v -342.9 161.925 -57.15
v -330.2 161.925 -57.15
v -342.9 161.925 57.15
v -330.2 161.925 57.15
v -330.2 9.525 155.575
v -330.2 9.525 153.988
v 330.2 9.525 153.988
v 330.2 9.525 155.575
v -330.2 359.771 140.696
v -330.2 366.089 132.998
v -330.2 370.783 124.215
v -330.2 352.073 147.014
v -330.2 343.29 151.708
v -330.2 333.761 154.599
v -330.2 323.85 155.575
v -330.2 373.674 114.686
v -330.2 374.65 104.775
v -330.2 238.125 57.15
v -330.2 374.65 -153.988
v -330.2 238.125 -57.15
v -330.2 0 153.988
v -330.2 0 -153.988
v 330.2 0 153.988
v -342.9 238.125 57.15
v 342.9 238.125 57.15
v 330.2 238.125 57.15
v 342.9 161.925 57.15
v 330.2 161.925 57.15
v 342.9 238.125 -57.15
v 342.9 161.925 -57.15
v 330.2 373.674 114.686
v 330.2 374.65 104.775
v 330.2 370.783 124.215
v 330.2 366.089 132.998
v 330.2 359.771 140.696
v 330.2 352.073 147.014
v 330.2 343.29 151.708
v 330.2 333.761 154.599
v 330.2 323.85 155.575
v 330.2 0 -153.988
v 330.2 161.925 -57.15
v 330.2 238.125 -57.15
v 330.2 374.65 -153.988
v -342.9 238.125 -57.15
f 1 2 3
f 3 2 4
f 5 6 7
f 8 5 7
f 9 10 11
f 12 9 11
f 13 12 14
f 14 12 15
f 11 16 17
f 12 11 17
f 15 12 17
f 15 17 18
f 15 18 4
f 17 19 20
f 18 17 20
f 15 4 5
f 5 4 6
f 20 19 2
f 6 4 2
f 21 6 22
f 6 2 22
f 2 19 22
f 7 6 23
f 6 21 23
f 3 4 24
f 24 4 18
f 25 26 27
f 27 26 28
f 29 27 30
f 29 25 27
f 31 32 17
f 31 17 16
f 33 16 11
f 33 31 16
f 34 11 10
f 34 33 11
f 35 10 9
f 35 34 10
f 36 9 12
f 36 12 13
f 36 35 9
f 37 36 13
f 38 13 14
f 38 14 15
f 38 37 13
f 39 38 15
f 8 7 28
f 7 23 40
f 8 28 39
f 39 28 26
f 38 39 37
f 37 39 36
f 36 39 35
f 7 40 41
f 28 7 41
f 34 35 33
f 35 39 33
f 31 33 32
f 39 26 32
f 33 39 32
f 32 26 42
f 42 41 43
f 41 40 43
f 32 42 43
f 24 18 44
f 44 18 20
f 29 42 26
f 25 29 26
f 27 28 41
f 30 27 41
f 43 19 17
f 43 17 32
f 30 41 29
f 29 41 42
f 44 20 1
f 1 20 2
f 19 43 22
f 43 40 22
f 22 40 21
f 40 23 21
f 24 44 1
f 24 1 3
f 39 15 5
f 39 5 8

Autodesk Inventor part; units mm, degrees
ref_plane "YZ Plane" through (0, 0, 0) normal (1, 0, 0) x (0, 1, 0)
ref_plane "XZ Plane" through (0, 0, 0) normal (0, 1, 0) x (-1, 0, 0)
ref_plane "XY Plane" through (0, 0, 0) normal (0, 0, 1) x (1, 0, 0)
sketch "Sketch1" plane through (0, 0, 0) normal (0, 1, 0) x (-1, 0, 0)
  line L0 (330.2, 153.9875) -> (-330.2, 153.9875)
  line L1 (-330.2, 153.9875) -> (-330.2, -153.9875)
  line L2 (-330.2, -153.9875) -> (330.2, -153.9875)
  line L3 (330.2, -153.9875) -> (330.2, 153.9875)
  line L4 (330.2, 153.9875) -> (-330.2, -153.9875) construction
  line L5 (-330.2, 153.9875) -> (330.2, -153.9875) construction
  point P0 (0, 0)
  dimension "d0" = 660.4
  dimension "d1" = 307.975
extrude "Extrusion1" add sketch "Sketch1" along normal blind 374.65
sketch "Sketch4" plane through (330.2, 0, 153.9875) normal (1, 0, 0) x (0, 0, -1)
  line L0 (96.8375, 161.925) -> (211.1375, 161.925)
  line L1 (211.1375, 161.925) -> (211.1375, 238.125)
  line L2 (211.1375, 238.125) -> (96.8375, 238.125)
  line L3 (96.8375, 238.125) -> (96.8375, 161.925)
  point P0 (153.9875, 0)
  point P1 (153.9875, 161.925)
  dimension "d11" = 114.3
  dimension "d12" = 161.925
  dimension "d13" = 76.2
extrude "Extrusion4" add sketch "Sketch4" along normal blind 12.7
mirror "Mirror1" about plane through (0, 0, 0) normal (1, 0, 0) of "Extrusion4"
sketch "Sketch6" plane through (-330.2, 0, 153.9875) normal (0, 0, 1) x (1, 0, 0)
  line L0 (0, 374.65) -> (660.4, 374.65) projected
  line L1 (0, 374.65) -> (0, 9.525)
  line L2 (0, 9.525) -> (660.4, 9.525)
  line L3 (660.4, 9.525) -> (660.4, 374.65)
  point P0 (330.2, 0)
  dimension "d22" = 9.525
extrude "Extrusion6" add sketch "Sketch6" along normal blind 1.5875
fillet "Fillet1" radius 50.8 1 edges at (0, 374.65, 155.575)
properties part number "Blue tool box" material "Steel"
